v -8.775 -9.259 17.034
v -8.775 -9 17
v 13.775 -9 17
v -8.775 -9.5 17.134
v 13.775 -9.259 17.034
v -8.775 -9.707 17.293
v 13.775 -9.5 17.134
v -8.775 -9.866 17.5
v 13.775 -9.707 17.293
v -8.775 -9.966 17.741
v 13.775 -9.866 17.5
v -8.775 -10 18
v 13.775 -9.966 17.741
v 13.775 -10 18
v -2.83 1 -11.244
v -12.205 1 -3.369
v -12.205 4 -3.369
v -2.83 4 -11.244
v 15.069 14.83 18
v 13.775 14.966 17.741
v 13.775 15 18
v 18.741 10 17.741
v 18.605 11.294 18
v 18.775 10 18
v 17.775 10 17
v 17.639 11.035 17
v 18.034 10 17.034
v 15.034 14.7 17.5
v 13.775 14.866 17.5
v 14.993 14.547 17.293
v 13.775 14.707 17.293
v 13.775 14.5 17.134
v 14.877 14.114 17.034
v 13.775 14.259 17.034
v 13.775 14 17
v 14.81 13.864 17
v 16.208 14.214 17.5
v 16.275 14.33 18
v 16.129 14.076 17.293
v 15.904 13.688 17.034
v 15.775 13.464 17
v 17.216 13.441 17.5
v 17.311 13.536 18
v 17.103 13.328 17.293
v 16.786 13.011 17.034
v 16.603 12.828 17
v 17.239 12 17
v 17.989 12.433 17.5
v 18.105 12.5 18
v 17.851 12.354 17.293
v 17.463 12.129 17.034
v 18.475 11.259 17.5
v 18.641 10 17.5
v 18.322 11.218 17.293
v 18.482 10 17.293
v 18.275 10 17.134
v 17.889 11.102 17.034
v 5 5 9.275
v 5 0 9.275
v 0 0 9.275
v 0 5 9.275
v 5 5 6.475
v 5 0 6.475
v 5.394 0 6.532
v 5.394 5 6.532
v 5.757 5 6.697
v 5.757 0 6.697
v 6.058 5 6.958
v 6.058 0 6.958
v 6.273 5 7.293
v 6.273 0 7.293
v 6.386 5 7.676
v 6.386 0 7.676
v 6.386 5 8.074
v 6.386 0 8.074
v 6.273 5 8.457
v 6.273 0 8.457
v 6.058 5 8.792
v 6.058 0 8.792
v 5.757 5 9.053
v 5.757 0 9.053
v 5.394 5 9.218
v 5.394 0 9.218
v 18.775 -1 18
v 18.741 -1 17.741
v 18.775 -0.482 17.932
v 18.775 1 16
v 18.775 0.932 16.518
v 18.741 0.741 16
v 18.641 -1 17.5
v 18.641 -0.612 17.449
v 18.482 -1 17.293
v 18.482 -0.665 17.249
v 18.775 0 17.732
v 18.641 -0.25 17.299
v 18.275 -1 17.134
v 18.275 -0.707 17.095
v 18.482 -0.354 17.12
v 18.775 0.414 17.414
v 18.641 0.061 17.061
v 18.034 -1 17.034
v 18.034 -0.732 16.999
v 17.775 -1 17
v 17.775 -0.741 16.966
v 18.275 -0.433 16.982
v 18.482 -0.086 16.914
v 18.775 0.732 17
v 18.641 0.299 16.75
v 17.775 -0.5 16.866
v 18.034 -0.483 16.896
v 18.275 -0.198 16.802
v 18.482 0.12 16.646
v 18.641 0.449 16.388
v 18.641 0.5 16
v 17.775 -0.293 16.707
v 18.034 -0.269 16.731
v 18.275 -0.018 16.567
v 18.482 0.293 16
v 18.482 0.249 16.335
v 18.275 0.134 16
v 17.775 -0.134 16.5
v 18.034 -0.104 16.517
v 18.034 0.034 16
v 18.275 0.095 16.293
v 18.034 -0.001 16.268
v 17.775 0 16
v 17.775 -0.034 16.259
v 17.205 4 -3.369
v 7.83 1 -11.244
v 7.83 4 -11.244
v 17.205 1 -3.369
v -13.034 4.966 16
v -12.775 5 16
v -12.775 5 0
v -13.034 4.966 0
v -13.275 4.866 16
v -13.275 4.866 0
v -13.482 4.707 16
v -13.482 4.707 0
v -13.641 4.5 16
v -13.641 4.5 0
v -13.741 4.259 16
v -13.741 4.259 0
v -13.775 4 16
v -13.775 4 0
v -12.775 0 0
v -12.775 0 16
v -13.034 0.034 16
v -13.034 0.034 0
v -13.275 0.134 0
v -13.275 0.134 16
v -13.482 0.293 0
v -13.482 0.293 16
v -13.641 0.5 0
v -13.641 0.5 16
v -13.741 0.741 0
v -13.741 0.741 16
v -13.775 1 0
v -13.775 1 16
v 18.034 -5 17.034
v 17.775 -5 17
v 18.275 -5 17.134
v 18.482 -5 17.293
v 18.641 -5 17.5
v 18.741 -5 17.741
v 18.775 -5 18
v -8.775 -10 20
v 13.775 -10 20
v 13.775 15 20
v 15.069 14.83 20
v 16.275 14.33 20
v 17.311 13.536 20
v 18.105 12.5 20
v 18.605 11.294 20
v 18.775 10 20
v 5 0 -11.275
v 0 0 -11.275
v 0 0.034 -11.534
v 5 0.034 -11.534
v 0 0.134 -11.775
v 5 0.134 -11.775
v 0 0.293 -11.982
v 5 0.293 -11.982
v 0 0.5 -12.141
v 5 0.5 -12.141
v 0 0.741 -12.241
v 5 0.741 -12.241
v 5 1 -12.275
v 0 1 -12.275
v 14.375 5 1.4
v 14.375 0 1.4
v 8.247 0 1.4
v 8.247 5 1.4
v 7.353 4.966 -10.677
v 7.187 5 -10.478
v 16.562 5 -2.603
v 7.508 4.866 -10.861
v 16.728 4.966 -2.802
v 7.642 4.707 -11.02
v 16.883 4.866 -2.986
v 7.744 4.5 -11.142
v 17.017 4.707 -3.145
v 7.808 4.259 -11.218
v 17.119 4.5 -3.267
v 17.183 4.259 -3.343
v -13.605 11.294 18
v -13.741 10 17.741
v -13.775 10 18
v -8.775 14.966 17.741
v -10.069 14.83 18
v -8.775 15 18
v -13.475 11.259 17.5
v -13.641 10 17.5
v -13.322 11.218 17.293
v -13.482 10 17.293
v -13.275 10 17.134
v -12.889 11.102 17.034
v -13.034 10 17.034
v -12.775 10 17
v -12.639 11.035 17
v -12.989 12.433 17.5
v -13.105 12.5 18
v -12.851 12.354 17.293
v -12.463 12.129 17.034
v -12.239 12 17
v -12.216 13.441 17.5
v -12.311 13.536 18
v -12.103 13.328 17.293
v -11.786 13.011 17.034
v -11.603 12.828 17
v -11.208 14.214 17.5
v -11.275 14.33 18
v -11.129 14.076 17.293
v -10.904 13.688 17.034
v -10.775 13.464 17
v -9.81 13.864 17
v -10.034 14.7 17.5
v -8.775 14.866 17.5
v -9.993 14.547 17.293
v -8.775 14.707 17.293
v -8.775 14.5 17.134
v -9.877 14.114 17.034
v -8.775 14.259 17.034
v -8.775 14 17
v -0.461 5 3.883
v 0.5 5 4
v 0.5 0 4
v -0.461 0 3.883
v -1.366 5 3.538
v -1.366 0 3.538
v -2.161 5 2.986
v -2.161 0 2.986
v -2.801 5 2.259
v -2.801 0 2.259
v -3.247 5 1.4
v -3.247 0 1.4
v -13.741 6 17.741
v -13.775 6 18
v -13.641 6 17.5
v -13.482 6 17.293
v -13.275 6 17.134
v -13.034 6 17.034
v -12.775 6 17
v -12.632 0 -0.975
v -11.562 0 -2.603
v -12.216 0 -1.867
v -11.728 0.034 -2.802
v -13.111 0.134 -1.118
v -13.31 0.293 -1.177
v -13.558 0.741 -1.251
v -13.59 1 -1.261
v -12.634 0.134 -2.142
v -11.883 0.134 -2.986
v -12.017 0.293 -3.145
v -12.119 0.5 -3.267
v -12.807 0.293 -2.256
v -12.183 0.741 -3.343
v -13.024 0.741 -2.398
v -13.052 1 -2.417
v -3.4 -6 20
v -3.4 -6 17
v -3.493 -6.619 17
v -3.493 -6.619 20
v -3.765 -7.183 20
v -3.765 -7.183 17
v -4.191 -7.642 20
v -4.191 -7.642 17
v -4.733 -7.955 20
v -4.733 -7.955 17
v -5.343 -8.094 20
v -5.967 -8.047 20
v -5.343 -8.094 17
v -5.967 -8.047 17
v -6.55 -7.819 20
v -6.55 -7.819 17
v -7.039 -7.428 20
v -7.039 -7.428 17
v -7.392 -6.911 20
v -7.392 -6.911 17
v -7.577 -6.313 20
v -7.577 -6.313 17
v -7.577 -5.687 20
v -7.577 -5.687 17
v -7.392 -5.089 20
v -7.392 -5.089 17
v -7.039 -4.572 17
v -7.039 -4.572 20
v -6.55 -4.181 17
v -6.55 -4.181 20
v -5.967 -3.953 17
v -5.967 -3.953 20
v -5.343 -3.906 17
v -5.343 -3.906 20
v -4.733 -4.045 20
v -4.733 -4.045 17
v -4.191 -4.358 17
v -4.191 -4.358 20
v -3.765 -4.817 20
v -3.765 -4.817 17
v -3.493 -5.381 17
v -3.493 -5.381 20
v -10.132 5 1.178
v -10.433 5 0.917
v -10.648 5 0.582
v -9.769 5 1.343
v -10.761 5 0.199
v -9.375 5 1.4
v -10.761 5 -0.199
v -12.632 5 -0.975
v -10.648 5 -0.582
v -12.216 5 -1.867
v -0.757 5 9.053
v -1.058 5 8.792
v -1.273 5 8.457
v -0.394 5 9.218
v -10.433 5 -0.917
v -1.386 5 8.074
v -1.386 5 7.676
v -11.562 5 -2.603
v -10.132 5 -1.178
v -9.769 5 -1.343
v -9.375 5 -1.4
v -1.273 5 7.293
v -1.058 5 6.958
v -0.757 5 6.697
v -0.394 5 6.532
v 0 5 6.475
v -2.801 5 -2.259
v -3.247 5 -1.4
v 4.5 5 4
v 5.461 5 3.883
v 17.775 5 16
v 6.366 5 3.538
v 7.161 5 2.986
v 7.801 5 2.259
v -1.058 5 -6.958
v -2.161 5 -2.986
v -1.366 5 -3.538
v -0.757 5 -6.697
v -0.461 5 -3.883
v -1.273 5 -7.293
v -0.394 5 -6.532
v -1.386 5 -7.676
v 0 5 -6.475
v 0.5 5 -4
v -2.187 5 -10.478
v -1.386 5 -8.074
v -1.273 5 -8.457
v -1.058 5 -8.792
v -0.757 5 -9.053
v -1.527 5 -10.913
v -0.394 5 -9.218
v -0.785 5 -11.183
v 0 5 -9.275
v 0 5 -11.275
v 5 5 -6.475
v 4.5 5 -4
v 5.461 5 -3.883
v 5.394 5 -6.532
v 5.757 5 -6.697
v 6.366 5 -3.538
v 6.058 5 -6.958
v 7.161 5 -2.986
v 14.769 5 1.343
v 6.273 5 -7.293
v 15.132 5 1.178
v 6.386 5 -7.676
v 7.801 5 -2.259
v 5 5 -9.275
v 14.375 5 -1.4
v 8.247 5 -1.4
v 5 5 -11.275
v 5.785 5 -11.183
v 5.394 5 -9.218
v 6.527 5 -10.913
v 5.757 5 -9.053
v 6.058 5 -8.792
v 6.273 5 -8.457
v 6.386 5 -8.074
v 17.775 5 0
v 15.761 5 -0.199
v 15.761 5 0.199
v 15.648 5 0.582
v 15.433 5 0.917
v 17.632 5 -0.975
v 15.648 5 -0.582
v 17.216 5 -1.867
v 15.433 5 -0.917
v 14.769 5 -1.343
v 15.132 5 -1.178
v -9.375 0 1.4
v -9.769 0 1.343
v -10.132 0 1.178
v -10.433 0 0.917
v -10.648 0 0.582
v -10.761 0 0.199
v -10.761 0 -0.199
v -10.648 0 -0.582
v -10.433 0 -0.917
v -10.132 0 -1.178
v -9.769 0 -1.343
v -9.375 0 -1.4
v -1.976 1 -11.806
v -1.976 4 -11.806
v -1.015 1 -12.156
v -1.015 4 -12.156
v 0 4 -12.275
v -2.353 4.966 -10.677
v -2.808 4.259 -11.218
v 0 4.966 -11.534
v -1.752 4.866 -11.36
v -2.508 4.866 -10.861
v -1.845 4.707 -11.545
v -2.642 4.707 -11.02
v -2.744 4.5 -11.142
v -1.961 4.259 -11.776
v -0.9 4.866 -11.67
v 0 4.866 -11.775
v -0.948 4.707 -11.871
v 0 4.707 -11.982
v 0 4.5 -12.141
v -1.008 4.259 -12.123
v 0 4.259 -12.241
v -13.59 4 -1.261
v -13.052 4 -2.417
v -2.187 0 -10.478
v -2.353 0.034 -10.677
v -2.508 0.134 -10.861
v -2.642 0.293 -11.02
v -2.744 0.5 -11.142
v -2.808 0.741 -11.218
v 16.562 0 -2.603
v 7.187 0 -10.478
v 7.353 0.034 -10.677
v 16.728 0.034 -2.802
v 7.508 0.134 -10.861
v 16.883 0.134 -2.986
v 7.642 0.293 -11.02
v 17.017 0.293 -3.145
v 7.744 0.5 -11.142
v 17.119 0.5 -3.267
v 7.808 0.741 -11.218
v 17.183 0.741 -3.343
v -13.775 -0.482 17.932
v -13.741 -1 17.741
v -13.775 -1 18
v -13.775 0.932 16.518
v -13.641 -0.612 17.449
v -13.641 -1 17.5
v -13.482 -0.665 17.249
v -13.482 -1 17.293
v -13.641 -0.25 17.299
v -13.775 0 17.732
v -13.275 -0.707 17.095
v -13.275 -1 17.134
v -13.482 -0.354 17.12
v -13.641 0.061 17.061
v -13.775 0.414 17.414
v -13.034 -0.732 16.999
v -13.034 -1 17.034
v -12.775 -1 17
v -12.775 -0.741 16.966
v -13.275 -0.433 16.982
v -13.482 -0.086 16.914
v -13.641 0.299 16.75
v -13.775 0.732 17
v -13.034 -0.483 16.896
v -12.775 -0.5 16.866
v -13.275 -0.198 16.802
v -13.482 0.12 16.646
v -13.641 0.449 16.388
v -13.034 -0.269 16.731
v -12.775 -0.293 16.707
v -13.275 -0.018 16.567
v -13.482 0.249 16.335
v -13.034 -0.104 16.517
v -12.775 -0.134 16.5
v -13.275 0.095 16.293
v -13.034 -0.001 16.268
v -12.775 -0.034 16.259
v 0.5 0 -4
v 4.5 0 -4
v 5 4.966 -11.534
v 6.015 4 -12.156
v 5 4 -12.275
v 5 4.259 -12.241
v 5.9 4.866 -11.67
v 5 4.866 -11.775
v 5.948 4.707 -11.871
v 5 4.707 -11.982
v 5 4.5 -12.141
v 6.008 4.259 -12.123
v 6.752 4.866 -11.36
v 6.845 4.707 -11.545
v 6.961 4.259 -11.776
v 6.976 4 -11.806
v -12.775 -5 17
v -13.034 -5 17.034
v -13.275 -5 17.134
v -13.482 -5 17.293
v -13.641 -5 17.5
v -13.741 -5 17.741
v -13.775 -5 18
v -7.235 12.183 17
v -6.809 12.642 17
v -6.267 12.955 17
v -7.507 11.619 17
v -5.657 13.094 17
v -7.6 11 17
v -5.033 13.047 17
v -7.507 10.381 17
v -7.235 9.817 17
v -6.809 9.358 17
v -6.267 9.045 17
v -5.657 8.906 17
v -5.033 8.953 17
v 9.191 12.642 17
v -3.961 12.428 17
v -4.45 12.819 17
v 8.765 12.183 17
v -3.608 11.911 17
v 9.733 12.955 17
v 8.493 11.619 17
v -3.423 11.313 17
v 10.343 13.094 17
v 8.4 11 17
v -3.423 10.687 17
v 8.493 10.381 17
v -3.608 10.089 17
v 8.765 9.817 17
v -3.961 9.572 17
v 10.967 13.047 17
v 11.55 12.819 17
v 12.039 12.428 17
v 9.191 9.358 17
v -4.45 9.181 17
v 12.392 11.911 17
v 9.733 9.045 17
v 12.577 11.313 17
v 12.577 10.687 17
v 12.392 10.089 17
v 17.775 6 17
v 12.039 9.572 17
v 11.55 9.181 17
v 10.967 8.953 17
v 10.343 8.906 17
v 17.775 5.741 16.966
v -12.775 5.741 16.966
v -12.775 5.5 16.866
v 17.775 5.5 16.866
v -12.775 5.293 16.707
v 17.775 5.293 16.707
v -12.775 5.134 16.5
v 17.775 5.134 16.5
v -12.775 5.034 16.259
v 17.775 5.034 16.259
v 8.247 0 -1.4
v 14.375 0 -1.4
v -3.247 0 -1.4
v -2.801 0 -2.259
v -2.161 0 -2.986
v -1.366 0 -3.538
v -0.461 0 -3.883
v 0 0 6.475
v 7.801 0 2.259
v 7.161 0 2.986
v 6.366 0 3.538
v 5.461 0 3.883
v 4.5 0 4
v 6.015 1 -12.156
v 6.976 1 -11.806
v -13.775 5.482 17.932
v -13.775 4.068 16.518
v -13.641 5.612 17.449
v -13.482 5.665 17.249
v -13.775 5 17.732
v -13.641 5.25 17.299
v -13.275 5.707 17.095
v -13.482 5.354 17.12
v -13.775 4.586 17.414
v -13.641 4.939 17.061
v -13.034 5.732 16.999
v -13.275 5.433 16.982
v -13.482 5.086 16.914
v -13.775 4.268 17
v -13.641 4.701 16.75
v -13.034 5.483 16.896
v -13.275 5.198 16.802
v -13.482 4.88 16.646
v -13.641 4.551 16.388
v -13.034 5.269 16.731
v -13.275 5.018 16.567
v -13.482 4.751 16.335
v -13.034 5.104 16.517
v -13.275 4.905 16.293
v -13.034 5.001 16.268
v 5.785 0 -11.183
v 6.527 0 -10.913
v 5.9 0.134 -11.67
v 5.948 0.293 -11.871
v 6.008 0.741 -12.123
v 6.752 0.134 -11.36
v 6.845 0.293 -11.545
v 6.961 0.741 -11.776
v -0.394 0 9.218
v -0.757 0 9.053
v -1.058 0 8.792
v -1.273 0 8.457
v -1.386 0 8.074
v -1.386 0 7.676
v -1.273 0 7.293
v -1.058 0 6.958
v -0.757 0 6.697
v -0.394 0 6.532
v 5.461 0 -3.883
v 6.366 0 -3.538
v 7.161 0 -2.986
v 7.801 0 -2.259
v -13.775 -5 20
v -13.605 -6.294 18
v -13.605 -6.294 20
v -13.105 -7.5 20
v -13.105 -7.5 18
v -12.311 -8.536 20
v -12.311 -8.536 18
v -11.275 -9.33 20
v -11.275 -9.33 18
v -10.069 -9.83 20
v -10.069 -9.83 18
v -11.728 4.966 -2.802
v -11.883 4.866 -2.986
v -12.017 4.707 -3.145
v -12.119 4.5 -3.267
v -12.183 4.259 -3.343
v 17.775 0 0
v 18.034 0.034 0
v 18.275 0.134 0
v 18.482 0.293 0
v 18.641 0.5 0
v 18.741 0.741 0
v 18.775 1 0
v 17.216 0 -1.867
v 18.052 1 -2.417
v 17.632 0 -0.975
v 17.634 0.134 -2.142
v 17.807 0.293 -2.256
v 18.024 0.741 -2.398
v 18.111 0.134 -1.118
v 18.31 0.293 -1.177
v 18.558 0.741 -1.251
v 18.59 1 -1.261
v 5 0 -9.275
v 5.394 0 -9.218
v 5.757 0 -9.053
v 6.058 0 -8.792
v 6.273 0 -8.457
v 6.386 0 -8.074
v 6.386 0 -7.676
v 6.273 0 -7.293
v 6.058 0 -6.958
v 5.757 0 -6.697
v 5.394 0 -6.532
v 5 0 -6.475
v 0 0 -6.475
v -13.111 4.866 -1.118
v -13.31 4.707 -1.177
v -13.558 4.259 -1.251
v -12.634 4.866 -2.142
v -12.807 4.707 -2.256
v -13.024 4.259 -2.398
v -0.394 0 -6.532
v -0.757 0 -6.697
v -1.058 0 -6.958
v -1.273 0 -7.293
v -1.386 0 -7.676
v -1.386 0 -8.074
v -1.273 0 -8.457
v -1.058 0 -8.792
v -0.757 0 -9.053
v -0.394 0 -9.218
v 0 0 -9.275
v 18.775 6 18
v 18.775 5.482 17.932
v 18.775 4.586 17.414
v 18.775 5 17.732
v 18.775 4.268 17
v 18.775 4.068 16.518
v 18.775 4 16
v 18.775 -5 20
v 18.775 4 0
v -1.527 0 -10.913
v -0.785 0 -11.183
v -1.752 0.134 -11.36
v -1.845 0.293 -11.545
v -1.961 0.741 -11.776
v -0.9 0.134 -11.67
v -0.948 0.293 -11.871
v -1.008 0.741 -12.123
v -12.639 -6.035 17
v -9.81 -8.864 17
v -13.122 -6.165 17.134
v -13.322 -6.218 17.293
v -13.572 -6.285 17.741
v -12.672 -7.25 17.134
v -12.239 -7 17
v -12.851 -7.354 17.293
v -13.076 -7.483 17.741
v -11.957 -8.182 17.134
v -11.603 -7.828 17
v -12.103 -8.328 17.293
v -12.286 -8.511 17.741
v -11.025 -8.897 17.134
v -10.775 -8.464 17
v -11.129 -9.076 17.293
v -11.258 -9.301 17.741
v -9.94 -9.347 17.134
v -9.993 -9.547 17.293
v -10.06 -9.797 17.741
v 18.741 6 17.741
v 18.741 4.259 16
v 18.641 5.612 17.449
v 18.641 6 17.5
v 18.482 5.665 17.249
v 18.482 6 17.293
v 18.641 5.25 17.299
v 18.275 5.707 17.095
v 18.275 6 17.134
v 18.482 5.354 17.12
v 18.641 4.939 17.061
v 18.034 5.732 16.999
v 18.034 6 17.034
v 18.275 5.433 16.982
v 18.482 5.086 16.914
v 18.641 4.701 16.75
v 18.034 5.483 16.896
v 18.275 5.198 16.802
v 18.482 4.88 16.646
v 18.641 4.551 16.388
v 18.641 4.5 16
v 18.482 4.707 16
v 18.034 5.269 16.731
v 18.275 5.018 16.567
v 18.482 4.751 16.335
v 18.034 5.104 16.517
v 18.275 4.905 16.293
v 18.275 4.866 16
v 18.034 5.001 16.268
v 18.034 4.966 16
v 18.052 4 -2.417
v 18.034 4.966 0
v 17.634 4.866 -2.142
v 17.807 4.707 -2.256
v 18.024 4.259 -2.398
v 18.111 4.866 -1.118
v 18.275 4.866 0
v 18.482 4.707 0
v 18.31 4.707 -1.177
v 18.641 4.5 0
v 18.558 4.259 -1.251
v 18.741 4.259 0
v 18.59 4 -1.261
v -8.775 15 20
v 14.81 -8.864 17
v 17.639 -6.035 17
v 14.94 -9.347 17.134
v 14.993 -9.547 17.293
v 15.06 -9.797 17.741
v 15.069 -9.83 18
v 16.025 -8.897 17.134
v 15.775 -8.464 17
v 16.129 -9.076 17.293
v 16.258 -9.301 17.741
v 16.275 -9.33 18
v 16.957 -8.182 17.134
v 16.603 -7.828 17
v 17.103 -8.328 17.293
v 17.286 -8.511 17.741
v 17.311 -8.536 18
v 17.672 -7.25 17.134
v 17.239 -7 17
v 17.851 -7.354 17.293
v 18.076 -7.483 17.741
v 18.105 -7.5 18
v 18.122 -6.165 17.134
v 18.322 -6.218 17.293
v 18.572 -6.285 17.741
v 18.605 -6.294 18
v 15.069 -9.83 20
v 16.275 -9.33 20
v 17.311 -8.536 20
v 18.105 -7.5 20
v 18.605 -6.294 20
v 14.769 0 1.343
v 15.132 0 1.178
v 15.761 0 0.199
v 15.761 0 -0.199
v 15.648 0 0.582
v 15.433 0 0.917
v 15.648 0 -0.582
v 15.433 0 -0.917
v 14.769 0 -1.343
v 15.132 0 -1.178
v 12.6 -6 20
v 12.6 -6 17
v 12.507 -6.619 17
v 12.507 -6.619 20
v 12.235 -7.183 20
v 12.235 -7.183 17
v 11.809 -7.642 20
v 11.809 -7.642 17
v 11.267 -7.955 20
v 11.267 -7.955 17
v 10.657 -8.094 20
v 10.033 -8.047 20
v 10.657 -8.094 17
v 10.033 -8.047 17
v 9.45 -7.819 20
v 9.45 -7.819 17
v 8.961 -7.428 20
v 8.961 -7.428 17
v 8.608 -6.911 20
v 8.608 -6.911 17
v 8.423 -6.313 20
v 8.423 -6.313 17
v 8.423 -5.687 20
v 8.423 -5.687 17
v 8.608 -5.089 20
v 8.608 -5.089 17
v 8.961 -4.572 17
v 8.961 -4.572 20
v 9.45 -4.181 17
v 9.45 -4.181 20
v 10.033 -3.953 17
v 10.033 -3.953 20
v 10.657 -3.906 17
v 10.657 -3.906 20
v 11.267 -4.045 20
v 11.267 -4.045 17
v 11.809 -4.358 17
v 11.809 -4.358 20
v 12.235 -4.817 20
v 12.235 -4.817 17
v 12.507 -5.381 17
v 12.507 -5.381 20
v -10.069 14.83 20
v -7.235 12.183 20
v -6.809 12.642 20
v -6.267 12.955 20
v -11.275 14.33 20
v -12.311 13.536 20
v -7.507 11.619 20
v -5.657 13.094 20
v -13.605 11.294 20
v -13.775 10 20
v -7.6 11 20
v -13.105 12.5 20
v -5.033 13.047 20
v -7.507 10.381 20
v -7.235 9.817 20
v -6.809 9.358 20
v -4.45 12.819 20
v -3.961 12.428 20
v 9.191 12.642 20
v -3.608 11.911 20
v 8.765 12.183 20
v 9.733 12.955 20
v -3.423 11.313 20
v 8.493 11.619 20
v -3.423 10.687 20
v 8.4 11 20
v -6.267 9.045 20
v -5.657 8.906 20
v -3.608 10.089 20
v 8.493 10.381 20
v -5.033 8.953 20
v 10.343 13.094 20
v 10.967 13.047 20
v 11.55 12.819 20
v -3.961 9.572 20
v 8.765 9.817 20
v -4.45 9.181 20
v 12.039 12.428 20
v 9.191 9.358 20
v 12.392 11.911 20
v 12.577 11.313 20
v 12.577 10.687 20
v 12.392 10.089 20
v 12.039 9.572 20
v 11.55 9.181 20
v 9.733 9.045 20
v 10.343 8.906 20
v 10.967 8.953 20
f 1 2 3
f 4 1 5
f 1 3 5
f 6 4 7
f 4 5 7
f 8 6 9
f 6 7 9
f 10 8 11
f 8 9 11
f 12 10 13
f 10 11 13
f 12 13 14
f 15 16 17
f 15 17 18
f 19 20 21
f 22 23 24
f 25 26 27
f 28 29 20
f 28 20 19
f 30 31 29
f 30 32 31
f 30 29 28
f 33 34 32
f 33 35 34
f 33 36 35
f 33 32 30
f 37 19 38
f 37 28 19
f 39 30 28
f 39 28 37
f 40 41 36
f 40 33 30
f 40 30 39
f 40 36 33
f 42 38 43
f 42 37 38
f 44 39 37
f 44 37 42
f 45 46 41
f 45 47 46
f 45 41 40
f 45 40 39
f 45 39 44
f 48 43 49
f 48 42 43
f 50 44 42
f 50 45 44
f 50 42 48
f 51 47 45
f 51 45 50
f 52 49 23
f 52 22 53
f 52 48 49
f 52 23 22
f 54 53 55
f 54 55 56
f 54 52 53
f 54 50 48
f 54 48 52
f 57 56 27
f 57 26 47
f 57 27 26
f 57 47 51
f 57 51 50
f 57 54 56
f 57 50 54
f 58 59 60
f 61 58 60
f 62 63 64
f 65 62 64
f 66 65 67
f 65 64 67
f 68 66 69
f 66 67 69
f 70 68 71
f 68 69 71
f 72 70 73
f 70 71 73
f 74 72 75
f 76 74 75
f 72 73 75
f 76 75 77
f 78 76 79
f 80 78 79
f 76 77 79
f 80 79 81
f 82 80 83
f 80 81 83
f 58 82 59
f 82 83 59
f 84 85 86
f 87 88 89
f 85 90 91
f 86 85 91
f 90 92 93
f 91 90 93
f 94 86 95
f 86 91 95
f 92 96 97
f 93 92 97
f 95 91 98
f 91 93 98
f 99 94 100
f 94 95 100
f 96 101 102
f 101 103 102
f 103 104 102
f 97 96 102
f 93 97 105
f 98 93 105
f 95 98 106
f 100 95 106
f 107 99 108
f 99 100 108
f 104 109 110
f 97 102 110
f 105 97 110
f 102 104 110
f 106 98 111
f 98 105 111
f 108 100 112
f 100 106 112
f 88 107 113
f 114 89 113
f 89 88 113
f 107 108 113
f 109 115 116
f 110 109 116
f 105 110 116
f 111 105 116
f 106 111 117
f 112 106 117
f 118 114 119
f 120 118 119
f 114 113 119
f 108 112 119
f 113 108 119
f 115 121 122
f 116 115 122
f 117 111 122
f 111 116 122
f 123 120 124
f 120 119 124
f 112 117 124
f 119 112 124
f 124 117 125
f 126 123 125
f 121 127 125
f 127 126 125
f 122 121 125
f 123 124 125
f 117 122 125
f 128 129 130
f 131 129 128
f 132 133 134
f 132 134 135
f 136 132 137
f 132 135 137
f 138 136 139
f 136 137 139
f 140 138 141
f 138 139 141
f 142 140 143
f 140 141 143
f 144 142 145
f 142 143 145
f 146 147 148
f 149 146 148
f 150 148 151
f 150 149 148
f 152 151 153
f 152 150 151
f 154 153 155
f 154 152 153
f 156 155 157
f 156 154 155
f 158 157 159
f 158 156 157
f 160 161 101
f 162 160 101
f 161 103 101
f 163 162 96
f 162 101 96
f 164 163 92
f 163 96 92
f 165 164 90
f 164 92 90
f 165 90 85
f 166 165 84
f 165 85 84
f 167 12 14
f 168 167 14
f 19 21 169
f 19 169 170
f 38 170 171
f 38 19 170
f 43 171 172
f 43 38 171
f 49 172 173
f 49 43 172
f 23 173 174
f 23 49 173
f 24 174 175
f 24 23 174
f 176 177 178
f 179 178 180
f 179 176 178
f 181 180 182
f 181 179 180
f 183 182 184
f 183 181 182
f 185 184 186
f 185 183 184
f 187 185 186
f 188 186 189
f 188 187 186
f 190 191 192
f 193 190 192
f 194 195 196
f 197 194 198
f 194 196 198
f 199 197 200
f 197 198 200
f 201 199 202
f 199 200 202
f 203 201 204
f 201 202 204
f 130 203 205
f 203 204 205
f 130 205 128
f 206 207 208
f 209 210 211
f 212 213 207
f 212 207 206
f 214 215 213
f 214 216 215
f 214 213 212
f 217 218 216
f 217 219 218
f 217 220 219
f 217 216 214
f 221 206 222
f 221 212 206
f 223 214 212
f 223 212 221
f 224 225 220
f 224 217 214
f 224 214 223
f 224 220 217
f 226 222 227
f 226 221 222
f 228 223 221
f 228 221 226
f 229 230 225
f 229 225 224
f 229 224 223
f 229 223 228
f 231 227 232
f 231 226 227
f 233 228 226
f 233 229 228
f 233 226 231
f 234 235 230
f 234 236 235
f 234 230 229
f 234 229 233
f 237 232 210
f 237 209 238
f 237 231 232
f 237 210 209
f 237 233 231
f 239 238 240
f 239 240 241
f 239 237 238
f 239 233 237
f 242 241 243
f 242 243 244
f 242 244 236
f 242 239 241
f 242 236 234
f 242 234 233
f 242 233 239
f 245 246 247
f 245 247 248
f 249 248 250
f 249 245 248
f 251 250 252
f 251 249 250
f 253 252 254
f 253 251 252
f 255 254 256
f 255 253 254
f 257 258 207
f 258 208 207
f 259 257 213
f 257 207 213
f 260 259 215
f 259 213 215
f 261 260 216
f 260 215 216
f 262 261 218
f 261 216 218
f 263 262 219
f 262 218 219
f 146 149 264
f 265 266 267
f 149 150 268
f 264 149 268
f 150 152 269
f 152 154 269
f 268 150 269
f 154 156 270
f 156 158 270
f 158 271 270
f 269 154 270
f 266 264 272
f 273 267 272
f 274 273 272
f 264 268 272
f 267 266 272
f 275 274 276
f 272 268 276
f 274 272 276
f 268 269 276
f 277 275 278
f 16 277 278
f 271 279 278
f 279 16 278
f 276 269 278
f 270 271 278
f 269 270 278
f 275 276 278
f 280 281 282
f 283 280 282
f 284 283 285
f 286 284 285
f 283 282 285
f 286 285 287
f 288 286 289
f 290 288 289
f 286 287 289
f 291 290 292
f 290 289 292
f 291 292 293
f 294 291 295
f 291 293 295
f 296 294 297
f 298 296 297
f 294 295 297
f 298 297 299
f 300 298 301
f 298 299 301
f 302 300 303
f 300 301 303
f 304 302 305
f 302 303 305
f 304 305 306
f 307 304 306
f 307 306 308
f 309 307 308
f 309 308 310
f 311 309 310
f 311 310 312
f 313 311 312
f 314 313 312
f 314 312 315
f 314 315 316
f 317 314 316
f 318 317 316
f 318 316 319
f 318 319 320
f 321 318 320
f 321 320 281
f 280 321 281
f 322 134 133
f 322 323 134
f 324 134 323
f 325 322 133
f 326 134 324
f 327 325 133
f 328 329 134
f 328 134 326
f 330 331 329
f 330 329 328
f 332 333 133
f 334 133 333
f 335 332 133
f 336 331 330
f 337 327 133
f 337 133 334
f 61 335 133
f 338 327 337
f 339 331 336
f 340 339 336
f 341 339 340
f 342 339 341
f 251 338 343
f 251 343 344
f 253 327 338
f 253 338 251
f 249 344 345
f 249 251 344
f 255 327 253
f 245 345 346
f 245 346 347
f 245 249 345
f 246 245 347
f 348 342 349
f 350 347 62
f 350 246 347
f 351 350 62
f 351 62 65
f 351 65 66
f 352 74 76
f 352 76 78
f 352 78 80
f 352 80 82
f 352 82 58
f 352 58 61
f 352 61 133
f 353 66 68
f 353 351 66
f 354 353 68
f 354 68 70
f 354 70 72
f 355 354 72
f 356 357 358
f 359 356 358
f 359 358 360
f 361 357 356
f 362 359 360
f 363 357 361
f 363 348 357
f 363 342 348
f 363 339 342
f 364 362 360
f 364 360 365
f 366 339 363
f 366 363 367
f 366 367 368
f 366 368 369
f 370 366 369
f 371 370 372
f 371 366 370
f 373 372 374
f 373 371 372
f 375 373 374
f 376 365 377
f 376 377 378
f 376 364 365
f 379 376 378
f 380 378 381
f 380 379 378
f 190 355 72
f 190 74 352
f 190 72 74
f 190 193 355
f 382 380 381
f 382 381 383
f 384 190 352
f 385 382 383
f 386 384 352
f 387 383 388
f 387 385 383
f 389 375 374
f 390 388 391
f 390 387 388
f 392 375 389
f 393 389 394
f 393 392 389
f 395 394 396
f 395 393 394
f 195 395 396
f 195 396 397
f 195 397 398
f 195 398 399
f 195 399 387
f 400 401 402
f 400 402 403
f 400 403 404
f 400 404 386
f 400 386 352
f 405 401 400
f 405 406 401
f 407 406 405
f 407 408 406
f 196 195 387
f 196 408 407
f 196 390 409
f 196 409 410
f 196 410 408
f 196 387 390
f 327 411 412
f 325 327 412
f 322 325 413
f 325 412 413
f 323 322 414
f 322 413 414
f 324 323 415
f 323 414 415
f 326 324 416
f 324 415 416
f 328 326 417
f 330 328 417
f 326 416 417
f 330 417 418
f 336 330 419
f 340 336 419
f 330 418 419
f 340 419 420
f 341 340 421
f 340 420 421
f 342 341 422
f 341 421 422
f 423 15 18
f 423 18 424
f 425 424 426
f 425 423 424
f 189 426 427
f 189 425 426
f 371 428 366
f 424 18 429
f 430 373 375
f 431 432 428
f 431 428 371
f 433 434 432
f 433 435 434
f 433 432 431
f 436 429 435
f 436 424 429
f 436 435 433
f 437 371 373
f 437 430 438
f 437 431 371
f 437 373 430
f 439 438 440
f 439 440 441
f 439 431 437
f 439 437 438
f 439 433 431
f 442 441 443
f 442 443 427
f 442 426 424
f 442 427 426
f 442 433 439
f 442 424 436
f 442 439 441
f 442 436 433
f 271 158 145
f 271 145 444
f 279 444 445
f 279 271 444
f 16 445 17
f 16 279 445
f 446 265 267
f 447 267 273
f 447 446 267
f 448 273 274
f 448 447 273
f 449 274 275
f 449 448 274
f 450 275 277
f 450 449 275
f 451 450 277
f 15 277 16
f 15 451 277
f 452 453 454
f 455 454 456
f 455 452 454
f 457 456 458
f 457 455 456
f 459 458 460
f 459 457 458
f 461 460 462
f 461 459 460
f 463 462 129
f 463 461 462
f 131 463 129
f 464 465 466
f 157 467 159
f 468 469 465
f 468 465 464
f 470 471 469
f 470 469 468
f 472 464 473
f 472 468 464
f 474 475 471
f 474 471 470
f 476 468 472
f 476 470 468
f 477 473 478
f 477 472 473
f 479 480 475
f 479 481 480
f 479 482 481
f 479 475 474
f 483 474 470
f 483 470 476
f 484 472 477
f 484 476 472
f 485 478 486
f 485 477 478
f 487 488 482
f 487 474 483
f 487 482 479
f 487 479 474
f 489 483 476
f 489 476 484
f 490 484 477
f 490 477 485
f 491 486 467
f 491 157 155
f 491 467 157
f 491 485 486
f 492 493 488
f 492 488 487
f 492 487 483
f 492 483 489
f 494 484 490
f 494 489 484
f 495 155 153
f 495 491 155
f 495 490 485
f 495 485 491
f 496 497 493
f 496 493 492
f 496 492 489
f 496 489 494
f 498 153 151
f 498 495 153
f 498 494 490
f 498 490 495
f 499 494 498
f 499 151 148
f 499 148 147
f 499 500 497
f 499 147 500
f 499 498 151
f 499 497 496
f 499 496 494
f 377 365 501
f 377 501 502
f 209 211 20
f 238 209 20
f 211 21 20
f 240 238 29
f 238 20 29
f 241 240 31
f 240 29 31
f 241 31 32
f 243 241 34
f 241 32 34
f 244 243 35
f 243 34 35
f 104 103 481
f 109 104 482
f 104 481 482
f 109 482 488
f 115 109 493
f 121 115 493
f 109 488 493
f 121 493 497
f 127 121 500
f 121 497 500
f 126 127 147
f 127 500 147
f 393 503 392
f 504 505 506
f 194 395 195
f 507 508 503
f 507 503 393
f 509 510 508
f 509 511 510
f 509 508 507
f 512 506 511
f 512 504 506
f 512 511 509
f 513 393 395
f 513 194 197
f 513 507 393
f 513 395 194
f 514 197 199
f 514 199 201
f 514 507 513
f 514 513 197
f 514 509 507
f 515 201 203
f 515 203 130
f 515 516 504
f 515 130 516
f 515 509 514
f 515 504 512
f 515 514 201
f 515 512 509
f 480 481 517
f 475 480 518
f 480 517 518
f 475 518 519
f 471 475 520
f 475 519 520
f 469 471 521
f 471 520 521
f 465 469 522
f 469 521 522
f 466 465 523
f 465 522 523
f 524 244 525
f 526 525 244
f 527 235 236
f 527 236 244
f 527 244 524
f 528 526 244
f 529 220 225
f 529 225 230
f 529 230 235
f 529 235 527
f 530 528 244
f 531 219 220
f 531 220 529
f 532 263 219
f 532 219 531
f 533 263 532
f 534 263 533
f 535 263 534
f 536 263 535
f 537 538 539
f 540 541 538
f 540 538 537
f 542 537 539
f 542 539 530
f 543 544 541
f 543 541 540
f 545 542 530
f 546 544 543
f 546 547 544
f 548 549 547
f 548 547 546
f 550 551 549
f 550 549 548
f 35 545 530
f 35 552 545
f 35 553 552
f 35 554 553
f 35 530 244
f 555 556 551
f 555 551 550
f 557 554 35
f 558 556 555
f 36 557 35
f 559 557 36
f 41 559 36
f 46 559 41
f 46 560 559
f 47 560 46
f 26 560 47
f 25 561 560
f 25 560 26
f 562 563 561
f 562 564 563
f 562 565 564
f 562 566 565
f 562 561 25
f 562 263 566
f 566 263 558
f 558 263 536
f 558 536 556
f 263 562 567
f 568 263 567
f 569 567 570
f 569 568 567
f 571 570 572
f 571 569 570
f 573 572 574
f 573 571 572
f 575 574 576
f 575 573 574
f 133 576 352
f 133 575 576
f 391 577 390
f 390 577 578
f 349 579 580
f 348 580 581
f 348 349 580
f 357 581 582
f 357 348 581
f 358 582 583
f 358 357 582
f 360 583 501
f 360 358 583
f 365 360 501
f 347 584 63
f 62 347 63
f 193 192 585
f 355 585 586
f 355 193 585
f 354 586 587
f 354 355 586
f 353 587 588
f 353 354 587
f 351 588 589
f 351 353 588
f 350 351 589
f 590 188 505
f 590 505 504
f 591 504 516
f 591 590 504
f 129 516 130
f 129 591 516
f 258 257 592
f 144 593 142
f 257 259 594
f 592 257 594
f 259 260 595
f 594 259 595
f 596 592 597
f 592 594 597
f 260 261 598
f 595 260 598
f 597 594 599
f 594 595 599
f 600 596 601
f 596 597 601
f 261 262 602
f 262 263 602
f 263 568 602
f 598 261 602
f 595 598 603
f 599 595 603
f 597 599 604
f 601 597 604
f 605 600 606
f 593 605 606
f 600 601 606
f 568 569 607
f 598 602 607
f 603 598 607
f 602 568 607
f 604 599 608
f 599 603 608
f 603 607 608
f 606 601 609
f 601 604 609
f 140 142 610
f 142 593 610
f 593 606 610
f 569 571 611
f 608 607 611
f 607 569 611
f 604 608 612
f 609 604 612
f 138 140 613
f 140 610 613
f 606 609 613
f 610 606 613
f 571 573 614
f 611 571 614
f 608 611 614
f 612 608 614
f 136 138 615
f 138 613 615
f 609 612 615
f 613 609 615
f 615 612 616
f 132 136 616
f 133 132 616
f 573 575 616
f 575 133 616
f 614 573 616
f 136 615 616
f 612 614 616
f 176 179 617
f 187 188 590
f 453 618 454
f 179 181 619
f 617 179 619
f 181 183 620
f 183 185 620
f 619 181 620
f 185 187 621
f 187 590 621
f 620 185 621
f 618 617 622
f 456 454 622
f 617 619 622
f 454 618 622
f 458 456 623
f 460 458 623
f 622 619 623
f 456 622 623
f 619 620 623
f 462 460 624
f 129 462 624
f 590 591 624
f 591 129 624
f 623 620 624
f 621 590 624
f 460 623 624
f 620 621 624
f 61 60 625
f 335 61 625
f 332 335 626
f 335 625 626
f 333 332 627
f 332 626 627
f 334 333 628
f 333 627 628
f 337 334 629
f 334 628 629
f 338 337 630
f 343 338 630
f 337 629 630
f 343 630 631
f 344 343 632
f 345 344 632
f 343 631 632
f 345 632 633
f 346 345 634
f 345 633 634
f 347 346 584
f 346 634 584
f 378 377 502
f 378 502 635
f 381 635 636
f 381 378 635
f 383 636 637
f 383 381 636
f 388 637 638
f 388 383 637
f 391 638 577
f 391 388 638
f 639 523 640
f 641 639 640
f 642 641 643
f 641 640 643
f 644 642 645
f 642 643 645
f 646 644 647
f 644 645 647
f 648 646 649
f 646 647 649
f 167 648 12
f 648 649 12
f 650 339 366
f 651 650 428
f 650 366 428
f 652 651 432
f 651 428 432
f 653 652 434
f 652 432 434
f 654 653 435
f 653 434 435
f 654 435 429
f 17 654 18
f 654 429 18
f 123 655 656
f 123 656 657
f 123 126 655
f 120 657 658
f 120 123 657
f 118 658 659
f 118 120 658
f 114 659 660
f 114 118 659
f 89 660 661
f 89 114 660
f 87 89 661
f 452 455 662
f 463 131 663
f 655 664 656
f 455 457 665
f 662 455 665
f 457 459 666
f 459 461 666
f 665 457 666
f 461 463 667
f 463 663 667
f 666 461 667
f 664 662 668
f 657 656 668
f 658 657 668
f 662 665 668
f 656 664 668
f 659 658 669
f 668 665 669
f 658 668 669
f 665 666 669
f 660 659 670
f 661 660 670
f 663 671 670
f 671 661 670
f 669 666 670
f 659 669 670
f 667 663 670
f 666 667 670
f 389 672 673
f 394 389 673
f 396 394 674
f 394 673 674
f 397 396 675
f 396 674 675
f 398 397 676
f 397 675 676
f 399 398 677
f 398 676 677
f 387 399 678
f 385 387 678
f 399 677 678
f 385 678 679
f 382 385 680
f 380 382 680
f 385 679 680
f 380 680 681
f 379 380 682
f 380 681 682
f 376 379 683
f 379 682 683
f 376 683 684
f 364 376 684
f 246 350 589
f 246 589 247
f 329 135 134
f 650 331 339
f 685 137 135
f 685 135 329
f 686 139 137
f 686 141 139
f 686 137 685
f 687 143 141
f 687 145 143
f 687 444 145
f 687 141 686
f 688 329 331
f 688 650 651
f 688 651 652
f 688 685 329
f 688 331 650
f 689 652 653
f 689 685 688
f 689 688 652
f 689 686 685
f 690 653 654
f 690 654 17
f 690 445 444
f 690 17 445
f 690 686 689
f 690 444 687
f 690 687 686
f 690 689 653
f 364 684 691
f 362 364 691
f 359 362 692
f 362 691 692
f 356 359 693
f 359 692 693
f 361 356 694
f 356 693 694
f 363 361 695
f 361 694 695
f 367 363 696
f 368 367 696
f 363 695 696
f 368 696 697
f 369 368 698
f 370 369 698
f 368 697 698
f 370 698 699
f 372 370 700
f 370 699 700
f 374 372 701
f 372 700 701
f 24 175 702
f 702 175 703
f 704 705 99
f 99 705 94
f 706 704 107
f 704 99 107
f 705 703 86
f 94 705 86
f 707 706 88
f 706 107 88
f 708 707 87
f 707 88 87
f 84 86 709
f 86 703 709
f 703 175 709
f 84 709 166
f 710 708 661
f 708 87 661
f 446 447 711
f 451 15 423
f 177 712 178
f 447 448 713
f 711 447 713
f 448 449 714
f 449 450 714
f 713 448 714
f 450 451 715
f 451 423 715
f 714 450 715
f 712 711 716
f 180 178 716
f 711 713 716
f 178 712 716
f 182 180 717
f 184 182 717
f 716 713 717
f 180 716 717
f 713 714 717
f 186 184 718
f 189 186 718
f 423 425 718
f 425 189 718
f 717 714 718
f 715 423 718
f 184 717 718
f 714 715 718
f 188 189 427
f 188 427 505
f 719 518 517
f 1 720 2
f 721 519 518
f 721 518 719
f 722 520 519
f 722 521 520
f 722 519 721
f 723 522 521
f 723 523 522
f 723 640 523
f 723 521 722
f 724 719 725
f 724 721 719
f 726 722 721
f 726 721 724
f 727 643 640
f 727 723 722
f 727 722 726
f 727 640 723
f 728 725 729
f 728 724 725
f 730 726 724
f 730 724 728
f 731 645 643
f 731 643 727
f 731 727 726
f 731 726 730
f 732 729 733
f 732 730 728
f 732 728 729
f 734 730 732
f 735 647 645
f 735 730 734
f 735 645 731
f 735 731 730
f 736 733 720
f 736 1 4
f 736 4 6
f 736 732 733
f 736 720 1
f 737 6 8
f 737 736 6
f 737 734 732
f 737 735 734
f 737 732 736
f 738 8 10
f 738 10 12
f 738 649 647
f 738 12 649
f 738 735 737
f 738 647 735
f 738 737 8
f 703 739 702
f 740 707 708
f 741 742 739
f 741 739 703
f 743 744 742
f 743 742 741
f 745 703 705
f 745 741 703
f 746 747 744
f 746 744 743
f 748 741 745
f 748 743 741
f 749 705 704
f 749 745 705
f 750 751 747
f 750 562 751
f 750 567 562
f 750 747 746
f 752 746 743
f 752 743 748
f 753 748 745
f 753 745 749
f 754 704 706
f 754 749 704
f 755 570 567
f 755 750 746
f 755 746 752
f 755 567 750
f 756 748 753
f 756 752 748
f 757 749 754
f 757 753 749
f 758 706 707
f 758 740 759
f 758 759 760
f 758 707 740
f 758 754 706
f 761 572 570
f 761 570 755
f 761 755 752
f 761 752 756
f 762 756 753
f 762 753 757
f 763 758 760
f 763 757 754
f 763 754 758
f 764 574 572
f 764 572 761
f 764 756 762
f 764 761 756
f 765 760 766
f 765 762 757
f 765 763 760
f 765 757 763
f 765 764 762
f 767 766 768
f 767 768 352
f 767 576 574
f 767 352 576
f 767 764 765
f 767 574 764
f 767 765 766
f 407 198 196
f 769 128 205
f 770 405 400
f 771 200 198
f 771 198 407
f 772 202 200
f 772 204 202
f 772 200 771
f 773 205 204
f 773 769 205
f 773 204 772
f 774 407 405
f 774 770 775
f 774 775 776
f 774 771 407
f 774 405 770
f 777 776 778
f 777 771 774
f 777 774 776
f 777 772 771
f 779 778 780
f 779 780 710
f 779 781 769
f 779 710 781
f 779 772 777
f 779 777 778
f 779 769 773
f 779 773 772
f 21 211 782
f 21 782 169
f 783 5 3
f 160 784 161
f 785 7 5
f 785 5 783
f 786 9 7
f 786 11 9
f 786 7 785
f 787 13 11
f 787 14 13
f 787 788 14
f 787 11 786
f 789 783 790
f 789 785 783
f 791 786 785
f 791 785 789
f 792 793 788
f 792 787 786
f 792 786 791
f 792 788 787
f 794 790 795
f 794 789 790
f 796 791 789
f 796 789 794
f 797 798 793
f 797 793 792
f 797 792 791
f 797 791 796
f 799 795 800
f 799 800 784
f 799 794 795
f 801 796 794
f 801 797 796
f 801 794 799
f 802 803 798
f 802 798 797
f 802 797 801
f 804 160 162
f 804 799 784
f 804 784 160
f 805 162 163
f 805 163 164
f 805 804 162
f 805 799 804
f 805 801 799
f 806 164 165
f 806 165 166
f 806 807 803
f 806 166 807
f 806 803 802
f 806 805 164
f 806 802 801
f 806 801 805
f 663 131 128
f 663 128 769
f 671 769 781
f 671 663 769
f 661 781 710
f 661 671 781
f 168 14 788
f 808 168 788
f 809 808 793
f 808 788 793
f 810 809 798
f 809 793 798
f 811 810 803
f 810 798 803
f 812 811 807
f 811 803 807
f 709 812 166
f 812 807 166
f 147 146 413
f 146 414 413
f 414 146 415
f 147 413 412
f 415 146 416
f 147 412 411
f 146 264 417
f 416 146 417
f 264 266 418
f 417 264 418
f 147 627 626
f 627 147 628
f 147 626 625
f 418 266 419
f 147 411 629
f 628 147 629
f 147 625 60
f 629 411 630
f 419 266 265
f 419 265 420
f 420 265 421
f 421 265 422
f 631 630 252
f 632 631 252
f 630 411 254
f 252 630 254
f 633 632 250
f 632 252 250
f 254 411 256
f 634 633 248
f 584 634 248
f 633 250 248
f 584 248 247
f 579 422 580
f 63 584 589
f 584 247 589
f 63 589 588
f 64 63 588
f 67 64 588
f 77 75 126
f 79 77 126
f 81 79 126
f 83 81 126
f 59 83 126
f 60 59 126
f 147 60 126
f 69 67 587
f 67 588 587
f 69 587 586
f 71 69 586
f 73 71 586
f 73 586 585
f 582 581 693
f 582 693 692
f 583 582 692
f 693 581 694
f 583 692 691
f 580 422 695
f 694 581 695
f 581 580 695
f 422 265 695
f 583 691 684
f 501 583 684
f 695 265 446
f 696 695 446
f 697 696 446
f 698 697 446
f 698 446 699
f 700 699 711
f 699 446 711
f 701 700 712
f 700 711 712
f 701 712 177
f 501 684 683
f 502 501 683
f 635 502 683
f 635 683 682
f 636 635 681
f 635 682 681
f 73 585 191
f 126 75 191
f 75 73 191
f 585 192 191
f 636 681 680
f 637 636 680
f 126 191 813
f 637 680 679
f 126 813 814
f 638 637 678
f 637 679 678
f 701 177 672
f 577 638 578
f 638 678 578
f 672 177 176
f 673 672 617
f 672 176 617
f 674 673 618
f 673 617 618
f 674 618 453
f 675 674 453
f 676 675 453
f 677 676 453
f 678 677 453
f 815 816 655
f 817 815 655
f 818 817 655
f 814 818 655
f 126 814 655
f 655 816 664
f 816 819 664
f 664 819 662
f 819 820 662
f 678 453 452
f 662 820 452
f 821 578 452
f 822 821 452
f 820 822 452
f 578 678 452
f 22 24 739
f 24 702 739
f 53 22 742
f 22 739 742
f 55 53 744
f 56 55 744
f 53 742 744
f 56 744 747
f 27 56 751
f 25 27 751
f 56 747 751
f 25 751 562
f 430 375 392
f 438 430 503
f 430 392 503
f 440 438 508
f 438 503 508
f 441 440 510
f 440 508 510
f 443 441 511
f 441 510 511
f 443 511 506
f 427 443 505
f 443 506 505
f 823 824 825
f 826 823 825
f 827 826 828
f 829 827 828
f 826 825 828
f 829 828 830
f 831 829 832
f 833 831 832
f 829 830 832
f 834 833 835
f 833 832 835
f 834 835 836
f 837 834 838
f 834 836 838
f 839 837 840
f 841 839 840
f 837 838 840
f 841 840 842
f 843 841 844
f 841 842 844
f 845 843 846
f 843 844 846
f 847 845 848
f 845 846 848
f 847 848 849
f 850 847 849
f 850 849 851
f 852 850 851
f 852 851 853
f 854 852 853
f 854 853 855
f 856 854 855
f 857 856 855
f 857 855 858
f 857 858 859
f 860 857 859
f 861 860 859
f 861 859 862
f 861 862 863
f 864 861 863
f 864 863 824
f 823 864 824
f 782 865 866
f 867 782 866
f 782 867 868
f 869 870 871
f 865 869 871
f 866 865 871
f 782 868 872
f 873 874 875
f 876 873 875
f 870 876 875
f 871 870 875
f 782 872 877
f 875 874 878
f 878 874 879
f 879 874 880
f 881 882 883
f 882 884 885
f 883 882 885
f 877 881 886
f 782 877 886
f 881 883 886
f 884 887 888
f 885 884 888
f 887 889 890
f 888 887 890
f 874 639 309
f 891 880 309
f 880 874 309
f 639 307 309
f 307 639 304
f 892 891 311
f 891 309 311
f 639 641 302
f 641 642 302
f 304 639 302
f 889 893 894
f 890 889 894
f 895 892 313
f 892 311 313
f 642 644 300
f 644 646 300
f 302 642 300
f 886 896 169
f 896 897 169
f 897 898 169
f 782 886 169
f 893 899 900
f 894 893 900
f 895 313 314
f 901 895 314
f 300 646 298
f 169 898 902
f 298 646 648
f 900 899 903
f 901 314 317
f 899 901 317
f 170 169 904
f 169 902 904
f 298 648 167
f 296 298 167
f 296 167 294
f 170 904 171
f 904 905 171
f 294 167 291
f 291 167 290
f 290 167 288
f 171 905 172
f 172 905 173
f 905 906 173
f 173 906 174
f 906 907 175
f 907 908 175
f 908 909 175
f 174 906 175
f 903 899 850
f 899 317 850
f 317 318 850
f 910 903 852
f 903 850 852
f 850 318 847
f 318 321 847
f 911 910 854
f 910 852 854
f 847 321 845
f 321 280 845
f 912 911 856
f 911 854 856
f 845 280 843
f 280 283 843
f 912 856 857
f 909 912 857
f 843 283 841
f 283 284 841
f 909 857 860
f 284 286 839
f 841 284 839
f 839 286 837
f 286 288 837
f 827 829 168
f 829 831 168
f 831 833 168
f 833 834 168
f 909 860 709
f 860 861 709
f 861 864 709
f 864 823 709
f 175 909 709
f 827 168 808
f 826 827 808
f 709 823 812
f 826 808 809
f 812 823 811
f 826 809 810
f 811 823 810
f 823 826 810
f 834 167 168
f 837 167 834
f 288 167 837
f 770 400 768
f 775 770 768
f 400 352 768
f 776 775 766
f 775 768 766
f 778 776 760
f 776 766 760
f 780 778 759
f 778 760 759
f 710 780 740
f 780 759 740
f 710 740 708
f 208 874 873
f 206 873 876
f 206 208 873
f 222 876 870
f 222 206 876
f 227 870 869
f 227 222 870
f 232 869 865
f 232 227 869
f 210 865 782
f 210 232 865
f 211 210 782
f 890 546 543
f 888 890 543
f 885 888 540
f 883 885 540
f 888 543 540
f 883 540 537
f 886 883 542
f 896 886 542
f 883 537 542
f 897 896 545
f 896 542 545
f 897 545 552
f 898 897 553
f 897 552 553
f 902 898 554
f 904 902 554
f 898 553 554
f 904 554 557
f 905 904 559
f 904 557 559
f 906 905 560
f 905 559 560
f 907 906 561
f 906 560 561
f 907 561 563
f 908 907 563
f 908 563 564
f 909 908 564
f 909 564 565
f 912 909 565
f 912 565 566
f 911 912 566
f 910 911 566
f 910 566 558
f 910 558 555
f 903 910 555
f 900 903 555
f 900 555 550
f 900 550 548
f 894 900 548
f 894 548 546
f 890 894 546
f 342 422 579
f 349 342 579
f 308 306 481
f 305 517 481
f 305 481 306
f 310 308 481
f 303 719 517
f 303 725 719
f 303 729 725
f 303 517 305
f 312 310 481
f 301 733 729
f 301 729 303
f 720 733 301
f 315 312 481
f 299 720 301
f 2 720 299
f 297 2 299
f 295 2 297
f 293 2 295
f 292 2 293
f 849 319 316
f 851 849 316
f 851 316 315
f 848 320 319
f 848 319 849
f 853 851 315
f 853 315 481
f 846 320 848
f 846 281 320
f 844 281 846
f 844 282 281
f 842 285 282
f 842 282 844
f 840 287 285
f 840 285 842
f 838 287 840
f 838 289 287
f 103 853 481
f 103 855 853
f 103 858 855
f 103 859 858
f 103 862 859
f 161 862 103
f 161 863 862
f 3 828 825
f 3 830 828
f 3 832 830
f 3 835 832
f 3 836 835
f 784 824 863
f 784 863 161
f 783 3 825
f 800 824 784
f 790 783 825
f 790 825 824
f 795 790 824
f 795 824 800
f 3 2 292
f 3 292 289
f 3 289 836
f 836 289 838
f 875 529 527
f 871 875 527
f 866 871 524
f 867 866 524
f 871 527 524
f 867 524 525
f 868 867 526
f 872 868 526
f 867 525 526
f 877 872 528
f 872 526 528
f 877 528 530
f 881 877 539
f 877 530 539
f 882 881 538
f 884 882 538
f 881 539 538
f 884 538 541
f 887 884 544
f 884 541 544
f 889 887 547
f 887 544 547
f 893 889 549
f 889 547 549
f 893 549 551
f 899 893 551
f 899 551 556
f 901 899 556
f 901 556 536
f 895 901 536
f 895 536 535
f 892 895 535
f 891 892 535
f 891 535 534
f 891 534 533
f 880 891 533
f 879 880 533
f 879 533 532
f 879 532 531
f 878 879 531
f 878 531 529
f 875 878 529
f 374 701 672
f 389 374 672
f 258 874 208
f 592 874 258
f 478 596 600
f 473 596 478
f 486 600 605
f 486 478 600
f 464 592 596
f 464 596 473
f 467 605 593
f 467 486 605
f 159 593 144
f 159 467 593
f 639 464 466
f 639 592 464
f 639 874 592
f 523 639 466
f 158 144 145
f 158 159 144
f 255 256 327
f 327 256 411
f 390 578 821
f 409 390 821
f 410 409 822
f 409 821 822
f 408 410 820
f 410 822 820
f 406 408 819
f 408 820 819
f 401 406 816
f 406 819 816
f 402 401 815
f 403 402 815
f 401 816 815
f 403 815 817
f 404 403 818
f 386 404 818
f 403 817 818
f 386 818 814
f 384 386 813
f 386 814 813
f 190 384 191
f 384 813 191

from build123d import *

# Parameters (mm, degrees)
BOSS_EXTRUDE1_DEPTH      = 5
CUT_EXTRUDE1_DEPTH       = 23.982085415
BOSS_EXTRUDE3_START      = -5
BOSS_EXTRUDE3_DEPTH      = 5
BOSS_EXTRUDE4_DEPTH      = 10
BOSS_EXTRUDE4_DEPTH_BACK = 15
SKETCH5_W                = 32.55
SKETCH5_H                = 3
SKETCH6_R                = 2.1
CUT_EXTRUDE2_DEPTH       = 10
FILLET1_R                = 5
FILLET2_R                = 1


with BuildPart() as part:
    # Sketch1 → Boss-Extrude1 (new body)
    with BuildSketch(Plane(origin=(0, 0, 0), x_dir=(1, 0, 0), z_dir=(0, 1, 0))):
        with BuildLine():
            Line((0, 12.275), (5, 12.275))
            ThreePointArc((5, 12.275), (6.505980381, 12.009250003), (7.83004518, 11.244101405))
            Line((7.83004518, 11.244101405), (17.20504518, 3.369101405))
            ThreePointArc((17.20504518, 3.369101405), (18.775, 0), (17.20504518, -3.369101405))
            Line((17.20504518, -3.369101405), (7.83004518, -11.244101405))
            ThreePointArc((7.83004518, -11.244101405), (6.505980381, -12.009250003), (5, -12.275))
            Line((5, -12.275), (0, -12.275))
            ThreePointArc((0, -12.275), (-1.505980381, -12.009250003), (-2.83004518, -11.244101405))
            Line((-2.83004518, -11.244101405), (-12.20504518, -3.369101405))
            ThreePointArc((-12.20504518, -3.369101405), (-13.775, 0), (-12.20504518, 3.369101405))
            Line((-12.20504518, 3.369101405), (-2.83004518, 11.244101405))
            ThreePointArc((-2.83004518, 11.244101405), (-1.505980381, 12.009250003), (0, 12.275))
        make_face()
        with BuildLine():
            Line((-9.375, 1.4), (14.375, 1.4))
            ThreePointArc((14.375, 1.4), (15.775, 0), (14.375, -1.4))
            Line((14.375, -1.4), (-9.375, -1.4))
            ThreePointArc((-9.375, -1.4), (-10.775, 0), (-9.375, 1.4))
        make_face(mode=Mode.SUBTRACT)
        with BuildLine():
            Line((0, 9.275), (5, 9.275))
            ThreePointArc((5, 9.275), (6.4, 7.875), (5, 6.475))
            Line((5, 6.475), (0, 6.475))
            ThreePointArc((0, 6.475), (-1.4, 7.875), (0, 9.275))
        make_face(mode=Mode.SUBTRACT)
        with BuildLine():
            Line((0, -6.475), (5, -6.475))
            ThreePointArc((5, -6.475), (6.4, -7.875), (5, -9.275))
            Line((5, -9.275), (0, -9.275))
            ThreePointArc((0, -9.275), (-1.4, -7.875), (0, -6.475))
        make_face(mode=Mode.SUBTRACT)
    extrude(amount=BOSS_EXTRUDE1_DEPTH)

    # Sketch2 → Cut-Extrude1 (cut, through all)
    with BuildSketch(Plane(origin=(0, 5, 0), x_dir=(1, 0, 0), z_dir=(0, 1, 0))):
        with BuildLine():
            Line((0.5, 4), (4.5, 4))
            ThreePointArc((4.5, 4), (8.5, 0), (4.5, -4))
            Line((4.5, -4), (0.5, -4))
            ThreePointArc((0.5, -4), (-3.5, 0), (0.5, 4))
        make_face()
    extrude(amount=-CUT_EXTRUDE1_DEPTH, mode=Mode.SUBTRACT)

    # Sketch4 → Boss-Extrude3 (add)
    with BuildSketch(Plane(origin=(0, 5, 0), x_dir=(1, 0, 0), z_dir=(0, 1, 0)).offset(BOSS_EXTRUDE3_START)):
        with BuildLine():
            Line((-13.775, 0), (-13.775, -20))
            Line((-13.775, -20), (18.775, -20))
            Line((18.775, -20), (18.775, 0))
            ThreePointArc((18.775, 0), (18.363245153, -1.858467273), (17.20504518, -3.369101405))
            Line((17.20504518, -3.369101405), (7.83004518, -11.244101405))
            ThreePointArc((7.83004518, -11.244101405), (6.505980381, -12.009250003), (5, -12.275))
            Line((5, -12.275), (0, -12.275))
            ThreePointArc((0, -12.275), (-1.505980381, -12.009250003), (-2.83004518, -11.244101405))
            Line((-2.83004518, -11.244101405), (-12.20504518, -3.369101405))
            ThreePointArc((-12.20504518, -3.369101405), (-13.363245153, -1.858467273), (-13.775, 0))
        make_face()
    extrude(amount=BOSS_EXTRUDE3_DEPTH)

    # Sketch5 → Boss-Extrude4 (add, two sides: drawn at the far end of the back side and taken through both)
    with BuildSketch(Plane(origin=(0, 5, 0), x_dir=(1, 0, 0), z_dir=(0, 1, 0)).offset(-BOSS_EXTRUDE4_DEPTH_BACK)):
        with Locations((2.5, -18.5)):
            Rectangle(SKETCH5_W, SKETCH5_H)
    extrude(amount=BOSS_EXTRUDE4_DEPTH + BOSS_EXTRUDE4_DEPTH_BACK)

    # Sketch6 → Cut-Extrude2 (cut)
    with BuildSketch(Plane(origin=(0, 0, 17), x_dir=(-1, 0, 0), z_dir=(0, 0, -1))):
        with Locations((-10.5, 11)):
            Circle(SKETCH6_R)
        with Locations((5.5, 11)):
            Circle(SKETCH6_R)
        with Locations(Location((5.5, -6, 0), (0, 0, 180))):
            Circle(SKETCH6_R)
        with Locations(Location((-10.5, -6, 0), (0, 0, 180))):
            Circle(SKETCH6_R)
    extrude(amount=-CUT_EXTRUDE2_DEPTH, mode=Mode.SUBTRACT)

    # Fillet1
    fillet1_edges = [part.edges().sort_by_distance(p)[0] for p in [
        (-13.775, -10, 18.5),
        (18.775, -10, 18.5),
        (-13.775, 15, 18.5),
        (18.775, 15, 18.5),
    ]]
    fillet(fillet1_edges, radius=FILLET1_R)

    # Fillet2
    fillet2_edges = [part.edges().sort_by_distance(p)[0] for p in [
        (18.363245153, 0, -1.858467273),
        (18.363245153, 5, -1.858467273),
        (-13.775, 0, 8.5),
        (-13.775, 5, 8.5),
        (2.5, 0, -12.275),
        (6.505980381, 0, -12.009250003),
        (-13.363245153, 5, -1.858467273),
        (12.51754518, 0, -7.306601405),
        (18.775, 5, 8.5),
        (18.775, 0, 8.5),
        (2.5, 0, 17),
        (2.5, 5, 17),
        (-13.775, 7.5, 17),
        (18.775, 7.5, 17),
        (-13.363245153, 0, -1.858467273),
        (-7.51754518, 0, -7.306601405),
        (-1.505980381, 0, -12.009250003),
        (18.775, -2.5, 17),
        (2.5, -10, 17),
        (-13.775, -2.5, 17),
        (-12.310533906, -8.535533906, 17),
        (17.310533906, -8.535533906, 17),
        (2.5, 15, 17),
        (-12.310533906, 13.535533906, 17),
        (17.310533906, 13.535533906, 17),
        (12.51754518, 5, -7.306601405),
        (6.505980381, 5, -12.009250003),
        (2.5, 5, -12.275),
        (-1.505980381, 5, -12.009250003),
        (-7.51754518, 5, -7.306601405),
    ]]
    fillet(fillet2_edges, radius=FILLET2_R)


solid = part.part
